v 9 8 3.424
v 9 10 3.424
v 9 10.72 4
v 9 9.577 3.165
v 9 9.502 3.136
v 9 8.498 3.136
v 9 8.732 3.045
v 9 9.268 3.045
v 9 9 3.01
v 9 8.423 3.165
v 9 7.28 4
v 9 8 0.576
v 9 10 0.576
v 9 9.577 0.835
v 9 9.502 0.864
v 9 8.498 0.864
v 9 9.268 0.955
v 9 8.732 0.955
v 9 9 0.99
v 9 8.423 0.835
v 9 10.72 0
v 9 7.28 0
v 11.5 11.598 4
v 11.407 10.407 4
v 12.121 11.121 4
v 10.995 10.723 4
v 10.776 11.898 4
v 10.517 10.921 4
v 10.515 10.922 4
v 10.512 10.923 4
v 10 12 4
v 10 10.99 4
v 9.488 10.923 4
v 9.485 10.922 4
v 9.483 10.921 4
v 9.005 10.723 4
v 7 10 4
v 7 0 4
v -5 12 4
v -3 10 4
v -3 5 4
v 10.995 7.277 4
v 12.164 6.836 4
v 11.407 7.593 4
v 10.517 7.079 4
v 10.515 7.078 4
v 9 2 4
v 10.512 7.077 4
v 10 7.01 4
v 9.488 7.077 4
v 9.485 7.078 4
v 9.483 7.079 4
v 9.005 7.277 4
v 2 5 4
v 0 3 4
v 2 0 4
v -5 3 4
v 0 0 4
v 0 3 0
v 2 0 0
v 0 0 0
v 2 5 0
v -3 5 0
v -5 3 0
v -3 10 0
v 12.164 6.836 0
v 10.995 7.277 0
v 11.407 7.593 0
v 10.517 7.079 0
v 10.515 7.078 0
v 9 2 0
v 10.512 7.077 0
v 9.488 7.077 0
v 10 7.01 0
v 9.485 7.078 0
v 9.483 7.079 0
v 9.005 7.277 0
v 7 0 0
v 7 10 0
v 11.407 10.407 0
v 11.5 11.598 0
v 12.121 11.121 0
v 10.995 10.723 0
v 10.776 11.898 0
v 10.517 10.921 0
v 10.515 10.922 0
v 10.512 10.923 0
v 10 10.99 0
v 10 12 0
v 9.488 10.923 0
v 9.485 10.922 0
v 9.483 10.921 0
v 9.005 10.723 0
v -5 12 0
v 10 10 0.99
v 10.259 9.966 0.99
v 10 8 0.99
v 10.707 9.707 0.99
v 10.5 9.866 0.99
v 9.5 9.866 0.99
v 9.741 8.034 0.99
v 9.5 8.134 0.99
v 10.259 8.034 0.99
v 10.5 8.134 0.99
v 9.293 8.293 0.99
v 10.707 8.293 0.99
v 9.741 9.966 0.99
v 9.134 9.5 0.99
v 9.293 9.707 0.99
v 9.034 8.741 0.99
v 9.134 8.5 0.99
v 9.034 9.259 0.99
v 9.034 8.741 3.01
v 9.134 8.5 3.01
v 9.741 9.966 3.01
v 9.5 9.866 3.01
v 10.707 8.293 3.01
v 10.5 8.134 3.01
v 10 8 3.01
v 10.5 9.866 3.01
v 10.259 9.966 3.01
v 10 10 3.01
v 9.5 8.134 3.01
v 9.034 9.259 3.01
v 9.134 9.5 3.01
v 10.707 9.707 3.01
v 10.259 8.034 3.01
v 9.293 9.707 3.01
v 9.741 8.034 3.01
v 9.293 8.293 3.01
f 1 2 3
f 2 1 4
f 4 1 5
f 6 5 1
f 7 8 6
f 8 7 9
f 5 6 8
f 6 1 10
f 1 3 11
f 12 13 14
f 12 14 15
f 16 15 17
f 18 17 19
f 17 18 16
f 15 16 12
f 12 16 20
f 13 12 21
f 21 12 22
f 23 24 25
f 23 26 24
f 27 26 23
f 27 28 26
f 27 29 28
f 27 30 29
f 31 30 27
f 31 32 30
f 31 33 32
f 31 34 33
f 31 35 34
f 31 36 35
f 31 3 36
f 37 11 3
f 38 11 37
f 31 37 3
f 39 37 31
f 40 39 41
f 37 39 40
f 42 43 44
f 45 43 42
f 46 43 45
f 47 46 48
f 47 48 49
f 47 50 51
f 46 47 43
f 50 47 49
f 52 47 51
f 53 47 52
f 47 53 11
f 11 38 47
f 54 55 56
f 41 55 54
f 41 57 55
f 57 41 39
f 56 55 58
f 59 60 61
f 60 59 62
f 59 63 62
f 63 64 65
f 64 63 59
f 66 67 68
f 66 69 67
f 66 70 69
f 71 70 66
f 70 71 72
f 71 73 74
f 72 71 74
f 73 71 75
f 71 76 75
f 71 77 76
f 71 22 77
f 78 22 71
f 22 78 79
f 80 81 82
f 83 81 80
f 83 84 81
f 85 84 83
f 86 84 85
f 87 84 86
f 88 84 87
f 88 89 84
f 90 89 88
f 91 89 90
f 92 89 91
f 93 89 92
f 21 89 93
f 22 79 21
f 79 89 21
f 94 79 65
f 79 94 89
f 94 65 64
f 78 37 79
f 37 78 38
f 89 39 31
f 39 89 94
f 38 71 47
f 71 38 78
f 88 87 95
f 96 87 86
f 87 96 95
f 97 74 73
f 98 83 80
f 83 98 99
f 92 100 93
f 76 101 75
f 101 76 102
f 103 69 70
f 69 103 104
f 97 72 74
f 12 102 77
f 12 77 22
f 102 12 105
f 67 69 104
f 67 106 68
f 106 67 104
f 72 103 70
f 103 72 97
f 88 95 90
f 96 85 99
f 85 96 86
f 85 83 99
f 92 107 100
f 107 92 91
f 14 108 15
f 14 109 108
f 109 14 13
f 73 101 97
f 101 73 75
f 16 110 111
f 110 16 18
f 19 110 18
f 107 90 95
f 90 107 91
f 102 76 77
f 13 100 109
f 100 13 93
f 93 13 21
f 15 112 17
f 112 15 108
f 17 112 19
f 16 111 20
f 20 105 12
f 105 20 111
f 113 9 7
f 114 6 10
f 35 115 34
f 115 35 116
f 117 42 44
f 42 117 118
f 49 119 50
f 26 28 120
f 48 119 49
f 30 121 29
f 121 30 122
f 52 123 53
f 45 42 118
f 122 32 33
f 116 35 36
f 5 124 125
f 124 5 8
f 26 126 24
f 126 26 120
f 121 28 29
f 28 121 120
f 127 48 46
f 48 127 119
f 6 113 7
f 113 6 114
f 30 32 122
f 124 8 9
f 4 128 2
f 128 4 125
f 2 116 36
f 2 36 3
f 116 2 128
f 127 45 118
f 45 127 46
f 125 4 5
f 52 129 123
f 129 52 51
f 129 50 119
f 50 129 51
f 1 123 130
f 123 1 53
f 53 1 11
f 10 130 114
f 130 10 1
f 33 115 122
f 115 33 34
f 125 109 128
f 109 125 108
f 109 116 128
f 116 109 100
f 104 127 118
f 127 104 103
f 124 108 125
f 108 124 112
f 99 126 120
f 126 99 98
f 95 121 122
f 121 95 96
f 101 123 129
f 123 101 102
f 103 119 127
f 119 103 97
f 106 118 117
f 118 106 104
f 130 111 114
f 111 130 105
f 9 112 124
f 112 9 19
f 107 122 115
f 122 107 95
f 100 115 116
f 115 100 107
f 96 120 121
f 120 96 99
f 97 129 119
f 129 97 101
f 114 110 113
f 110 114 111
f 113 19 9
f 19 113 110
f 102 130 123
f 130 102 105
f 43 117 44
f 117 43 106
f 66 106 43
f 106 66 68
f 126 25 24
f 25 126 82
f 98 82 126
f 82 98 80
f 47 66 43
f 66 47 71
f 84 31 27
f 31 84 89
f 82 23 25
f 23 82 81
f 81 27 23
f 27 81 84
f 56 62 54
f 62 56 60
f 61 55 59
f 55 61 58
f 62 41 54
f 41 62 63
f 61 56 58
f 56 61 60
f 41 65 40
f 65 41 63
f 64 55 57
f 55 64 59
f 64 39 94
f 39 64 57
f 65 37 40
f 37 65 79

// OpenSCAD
// file: filament_jaw.scad
$fn = 24;

default_filament_diameter = 1.75 + 0.1;
default_extrude_depth = 4;
default_shell_thickness = 2;
default_bevel_radius = 1;

filament_jaw();

module filament_jaw(
    filament_diameter = default_filament_diameter,
    extrude_depth = default_extrude_depth,
    shell_thickness = default_shell_thickness,
    bevel_radius = default_bevel_radius,
    wall_size = 10)
{
    filament_jaw_od = filament_diameter + (shell_thickness * 2);
    filament_jaw_or = filament_jaw_od / 2; 
    filament_jaw_id = filament_diameter;
    filament_jaw_ir = filament_jaw_id / 2;

    translate([filament_jaw_or, wall_size - filament_jaw_or, 0])
    difference()
    {
        body();
        hole();
    }

    module body()
    {
        hull()
        {
            translate([
                -filament_jaw_or,
                filament_jaw_or - wall_size,
                0])
            cube([
                shell_thickness,
                wall_size,
                extrude_depth]);

            cylinder(
                r = filament_jaw_or, 
                h = extrude_depth);
        }
        
    }

    module hole()
    {
        translate([0, 0, -0.01])
        cylinder(
            r1 = filament_jaw_ir + bevel_radius,
            r2 = filament_jaw_ir, 
            h = bevel_radius);

        translate([0, 0, extrude_depth - bevel_radius + 0.01])
        cylinder(
            r1 = filament_jaw_ir,
            r2 = filament_jaw_ir  + bevel_radius, 
            h = bevel_radius);

        translate([0, 0, -1])
        cylinder(
            r = filament_jaw_ir, 
            h = extrude_depth + 2);

        rotate(180,0,0)
        translate([-filament_jaw_or, 0, -1])        
        cylinder(
            r = filament_jaw_or, 
            h = extrude_depth + 2,
            $fn = 4);
    }
}
// main file
use <filament_jaw.scad>;

default_filament_diameter = 2.0;
default_extrude_depth = 4;
default_shell_thickness = 2;

// going clockwise looking at the clip, with the filament jaw on the right
default_segment_1 = 5;
default_segment_2 = 5;
default_segment_3 = 5;
default_segment_4 = 5;

spool_clip();

module spool_clip(
    filament_diameter = default_filament_diameter,
    extrude_depth = default_extrude_depth,
    shell_thickness = default_shell_thickness,    
    segment_1 = default_segment_1,
    segment_2 = default_segment_2,
    segment_3 = default_segment_3,
    segment_4 = default_segment_4
)
{
    union()
    {
        draw_segment_1();    
        draw_segment_2();    
        draw_segment_3();    
        draw_segment_4();    
        draw_segment_5();    
        draw_filament_jaw();
    }
    
    module draw_segment_1()
    {
        //color([1,0,0])
        cube([
            shell_thickness, 
            segment_1, 
            extrude_depth]);
    }
    
    module draw_segment_2()
    {
        //color([0,1,0])
        translate([
            shell_thickness - segment_2, 
            segment_1 - shell_thickness, 
            0])
        cube([
            segment_2, 
            shell_thickness, 
            extrude_depth]);
    }
    
    module draw_segment_3()
    {
        //color([0,0,1])
        translate([
            -(segment_2), 
            segment_1 - shell_thickness, 
            0])
        cube([
            shell_thickness, 
            segment_3 + shell_thickness, 
            extrude_depth]);
    }
    
    module draw_segment_4()
    {
        //color([1,1,0])
        translate([
            -(segment_2), 
            segment_1 + segment_3, 
            0])
        cube([
            segment_4 + segment_2 + shell_thickness,
            shell_thickness,  
            extrude_depth]);
    }
    
    module draw_segment_5()
    {
        //color([0,1,1])
        translate([
            segment_4 + shell_thickness, 
            0, 
            0])
        difference()
        {
            cube([
                shell_thickness, 
                segment_1 + segment_3 + shell_thickness, 
                extrude_depth]);

            rotate(-45)
            translate([
                0,
                0,
                -1
            ])
            cube([
                shell_thickness * 2, 
                shell_thickness * 2, 
                extrude_depth + 2]);            
        }
    }    

    module draw_filament_jaw()
    {
        diameter = filament_diameter + (shell_thickness * 2);
        radius = diameter / 2;

        //color([1,0,1])
        translate([
            segment_4 + shell_thickness, 
            shell_thickness, 
            0])
        filament_jaw(
            filament_diameter = filament_diameter,
            shell_thickness = shell_thickness,
            extrude_depth = extrude_depth,
            wall_size = segment_1 + segment_3);
    }
}
